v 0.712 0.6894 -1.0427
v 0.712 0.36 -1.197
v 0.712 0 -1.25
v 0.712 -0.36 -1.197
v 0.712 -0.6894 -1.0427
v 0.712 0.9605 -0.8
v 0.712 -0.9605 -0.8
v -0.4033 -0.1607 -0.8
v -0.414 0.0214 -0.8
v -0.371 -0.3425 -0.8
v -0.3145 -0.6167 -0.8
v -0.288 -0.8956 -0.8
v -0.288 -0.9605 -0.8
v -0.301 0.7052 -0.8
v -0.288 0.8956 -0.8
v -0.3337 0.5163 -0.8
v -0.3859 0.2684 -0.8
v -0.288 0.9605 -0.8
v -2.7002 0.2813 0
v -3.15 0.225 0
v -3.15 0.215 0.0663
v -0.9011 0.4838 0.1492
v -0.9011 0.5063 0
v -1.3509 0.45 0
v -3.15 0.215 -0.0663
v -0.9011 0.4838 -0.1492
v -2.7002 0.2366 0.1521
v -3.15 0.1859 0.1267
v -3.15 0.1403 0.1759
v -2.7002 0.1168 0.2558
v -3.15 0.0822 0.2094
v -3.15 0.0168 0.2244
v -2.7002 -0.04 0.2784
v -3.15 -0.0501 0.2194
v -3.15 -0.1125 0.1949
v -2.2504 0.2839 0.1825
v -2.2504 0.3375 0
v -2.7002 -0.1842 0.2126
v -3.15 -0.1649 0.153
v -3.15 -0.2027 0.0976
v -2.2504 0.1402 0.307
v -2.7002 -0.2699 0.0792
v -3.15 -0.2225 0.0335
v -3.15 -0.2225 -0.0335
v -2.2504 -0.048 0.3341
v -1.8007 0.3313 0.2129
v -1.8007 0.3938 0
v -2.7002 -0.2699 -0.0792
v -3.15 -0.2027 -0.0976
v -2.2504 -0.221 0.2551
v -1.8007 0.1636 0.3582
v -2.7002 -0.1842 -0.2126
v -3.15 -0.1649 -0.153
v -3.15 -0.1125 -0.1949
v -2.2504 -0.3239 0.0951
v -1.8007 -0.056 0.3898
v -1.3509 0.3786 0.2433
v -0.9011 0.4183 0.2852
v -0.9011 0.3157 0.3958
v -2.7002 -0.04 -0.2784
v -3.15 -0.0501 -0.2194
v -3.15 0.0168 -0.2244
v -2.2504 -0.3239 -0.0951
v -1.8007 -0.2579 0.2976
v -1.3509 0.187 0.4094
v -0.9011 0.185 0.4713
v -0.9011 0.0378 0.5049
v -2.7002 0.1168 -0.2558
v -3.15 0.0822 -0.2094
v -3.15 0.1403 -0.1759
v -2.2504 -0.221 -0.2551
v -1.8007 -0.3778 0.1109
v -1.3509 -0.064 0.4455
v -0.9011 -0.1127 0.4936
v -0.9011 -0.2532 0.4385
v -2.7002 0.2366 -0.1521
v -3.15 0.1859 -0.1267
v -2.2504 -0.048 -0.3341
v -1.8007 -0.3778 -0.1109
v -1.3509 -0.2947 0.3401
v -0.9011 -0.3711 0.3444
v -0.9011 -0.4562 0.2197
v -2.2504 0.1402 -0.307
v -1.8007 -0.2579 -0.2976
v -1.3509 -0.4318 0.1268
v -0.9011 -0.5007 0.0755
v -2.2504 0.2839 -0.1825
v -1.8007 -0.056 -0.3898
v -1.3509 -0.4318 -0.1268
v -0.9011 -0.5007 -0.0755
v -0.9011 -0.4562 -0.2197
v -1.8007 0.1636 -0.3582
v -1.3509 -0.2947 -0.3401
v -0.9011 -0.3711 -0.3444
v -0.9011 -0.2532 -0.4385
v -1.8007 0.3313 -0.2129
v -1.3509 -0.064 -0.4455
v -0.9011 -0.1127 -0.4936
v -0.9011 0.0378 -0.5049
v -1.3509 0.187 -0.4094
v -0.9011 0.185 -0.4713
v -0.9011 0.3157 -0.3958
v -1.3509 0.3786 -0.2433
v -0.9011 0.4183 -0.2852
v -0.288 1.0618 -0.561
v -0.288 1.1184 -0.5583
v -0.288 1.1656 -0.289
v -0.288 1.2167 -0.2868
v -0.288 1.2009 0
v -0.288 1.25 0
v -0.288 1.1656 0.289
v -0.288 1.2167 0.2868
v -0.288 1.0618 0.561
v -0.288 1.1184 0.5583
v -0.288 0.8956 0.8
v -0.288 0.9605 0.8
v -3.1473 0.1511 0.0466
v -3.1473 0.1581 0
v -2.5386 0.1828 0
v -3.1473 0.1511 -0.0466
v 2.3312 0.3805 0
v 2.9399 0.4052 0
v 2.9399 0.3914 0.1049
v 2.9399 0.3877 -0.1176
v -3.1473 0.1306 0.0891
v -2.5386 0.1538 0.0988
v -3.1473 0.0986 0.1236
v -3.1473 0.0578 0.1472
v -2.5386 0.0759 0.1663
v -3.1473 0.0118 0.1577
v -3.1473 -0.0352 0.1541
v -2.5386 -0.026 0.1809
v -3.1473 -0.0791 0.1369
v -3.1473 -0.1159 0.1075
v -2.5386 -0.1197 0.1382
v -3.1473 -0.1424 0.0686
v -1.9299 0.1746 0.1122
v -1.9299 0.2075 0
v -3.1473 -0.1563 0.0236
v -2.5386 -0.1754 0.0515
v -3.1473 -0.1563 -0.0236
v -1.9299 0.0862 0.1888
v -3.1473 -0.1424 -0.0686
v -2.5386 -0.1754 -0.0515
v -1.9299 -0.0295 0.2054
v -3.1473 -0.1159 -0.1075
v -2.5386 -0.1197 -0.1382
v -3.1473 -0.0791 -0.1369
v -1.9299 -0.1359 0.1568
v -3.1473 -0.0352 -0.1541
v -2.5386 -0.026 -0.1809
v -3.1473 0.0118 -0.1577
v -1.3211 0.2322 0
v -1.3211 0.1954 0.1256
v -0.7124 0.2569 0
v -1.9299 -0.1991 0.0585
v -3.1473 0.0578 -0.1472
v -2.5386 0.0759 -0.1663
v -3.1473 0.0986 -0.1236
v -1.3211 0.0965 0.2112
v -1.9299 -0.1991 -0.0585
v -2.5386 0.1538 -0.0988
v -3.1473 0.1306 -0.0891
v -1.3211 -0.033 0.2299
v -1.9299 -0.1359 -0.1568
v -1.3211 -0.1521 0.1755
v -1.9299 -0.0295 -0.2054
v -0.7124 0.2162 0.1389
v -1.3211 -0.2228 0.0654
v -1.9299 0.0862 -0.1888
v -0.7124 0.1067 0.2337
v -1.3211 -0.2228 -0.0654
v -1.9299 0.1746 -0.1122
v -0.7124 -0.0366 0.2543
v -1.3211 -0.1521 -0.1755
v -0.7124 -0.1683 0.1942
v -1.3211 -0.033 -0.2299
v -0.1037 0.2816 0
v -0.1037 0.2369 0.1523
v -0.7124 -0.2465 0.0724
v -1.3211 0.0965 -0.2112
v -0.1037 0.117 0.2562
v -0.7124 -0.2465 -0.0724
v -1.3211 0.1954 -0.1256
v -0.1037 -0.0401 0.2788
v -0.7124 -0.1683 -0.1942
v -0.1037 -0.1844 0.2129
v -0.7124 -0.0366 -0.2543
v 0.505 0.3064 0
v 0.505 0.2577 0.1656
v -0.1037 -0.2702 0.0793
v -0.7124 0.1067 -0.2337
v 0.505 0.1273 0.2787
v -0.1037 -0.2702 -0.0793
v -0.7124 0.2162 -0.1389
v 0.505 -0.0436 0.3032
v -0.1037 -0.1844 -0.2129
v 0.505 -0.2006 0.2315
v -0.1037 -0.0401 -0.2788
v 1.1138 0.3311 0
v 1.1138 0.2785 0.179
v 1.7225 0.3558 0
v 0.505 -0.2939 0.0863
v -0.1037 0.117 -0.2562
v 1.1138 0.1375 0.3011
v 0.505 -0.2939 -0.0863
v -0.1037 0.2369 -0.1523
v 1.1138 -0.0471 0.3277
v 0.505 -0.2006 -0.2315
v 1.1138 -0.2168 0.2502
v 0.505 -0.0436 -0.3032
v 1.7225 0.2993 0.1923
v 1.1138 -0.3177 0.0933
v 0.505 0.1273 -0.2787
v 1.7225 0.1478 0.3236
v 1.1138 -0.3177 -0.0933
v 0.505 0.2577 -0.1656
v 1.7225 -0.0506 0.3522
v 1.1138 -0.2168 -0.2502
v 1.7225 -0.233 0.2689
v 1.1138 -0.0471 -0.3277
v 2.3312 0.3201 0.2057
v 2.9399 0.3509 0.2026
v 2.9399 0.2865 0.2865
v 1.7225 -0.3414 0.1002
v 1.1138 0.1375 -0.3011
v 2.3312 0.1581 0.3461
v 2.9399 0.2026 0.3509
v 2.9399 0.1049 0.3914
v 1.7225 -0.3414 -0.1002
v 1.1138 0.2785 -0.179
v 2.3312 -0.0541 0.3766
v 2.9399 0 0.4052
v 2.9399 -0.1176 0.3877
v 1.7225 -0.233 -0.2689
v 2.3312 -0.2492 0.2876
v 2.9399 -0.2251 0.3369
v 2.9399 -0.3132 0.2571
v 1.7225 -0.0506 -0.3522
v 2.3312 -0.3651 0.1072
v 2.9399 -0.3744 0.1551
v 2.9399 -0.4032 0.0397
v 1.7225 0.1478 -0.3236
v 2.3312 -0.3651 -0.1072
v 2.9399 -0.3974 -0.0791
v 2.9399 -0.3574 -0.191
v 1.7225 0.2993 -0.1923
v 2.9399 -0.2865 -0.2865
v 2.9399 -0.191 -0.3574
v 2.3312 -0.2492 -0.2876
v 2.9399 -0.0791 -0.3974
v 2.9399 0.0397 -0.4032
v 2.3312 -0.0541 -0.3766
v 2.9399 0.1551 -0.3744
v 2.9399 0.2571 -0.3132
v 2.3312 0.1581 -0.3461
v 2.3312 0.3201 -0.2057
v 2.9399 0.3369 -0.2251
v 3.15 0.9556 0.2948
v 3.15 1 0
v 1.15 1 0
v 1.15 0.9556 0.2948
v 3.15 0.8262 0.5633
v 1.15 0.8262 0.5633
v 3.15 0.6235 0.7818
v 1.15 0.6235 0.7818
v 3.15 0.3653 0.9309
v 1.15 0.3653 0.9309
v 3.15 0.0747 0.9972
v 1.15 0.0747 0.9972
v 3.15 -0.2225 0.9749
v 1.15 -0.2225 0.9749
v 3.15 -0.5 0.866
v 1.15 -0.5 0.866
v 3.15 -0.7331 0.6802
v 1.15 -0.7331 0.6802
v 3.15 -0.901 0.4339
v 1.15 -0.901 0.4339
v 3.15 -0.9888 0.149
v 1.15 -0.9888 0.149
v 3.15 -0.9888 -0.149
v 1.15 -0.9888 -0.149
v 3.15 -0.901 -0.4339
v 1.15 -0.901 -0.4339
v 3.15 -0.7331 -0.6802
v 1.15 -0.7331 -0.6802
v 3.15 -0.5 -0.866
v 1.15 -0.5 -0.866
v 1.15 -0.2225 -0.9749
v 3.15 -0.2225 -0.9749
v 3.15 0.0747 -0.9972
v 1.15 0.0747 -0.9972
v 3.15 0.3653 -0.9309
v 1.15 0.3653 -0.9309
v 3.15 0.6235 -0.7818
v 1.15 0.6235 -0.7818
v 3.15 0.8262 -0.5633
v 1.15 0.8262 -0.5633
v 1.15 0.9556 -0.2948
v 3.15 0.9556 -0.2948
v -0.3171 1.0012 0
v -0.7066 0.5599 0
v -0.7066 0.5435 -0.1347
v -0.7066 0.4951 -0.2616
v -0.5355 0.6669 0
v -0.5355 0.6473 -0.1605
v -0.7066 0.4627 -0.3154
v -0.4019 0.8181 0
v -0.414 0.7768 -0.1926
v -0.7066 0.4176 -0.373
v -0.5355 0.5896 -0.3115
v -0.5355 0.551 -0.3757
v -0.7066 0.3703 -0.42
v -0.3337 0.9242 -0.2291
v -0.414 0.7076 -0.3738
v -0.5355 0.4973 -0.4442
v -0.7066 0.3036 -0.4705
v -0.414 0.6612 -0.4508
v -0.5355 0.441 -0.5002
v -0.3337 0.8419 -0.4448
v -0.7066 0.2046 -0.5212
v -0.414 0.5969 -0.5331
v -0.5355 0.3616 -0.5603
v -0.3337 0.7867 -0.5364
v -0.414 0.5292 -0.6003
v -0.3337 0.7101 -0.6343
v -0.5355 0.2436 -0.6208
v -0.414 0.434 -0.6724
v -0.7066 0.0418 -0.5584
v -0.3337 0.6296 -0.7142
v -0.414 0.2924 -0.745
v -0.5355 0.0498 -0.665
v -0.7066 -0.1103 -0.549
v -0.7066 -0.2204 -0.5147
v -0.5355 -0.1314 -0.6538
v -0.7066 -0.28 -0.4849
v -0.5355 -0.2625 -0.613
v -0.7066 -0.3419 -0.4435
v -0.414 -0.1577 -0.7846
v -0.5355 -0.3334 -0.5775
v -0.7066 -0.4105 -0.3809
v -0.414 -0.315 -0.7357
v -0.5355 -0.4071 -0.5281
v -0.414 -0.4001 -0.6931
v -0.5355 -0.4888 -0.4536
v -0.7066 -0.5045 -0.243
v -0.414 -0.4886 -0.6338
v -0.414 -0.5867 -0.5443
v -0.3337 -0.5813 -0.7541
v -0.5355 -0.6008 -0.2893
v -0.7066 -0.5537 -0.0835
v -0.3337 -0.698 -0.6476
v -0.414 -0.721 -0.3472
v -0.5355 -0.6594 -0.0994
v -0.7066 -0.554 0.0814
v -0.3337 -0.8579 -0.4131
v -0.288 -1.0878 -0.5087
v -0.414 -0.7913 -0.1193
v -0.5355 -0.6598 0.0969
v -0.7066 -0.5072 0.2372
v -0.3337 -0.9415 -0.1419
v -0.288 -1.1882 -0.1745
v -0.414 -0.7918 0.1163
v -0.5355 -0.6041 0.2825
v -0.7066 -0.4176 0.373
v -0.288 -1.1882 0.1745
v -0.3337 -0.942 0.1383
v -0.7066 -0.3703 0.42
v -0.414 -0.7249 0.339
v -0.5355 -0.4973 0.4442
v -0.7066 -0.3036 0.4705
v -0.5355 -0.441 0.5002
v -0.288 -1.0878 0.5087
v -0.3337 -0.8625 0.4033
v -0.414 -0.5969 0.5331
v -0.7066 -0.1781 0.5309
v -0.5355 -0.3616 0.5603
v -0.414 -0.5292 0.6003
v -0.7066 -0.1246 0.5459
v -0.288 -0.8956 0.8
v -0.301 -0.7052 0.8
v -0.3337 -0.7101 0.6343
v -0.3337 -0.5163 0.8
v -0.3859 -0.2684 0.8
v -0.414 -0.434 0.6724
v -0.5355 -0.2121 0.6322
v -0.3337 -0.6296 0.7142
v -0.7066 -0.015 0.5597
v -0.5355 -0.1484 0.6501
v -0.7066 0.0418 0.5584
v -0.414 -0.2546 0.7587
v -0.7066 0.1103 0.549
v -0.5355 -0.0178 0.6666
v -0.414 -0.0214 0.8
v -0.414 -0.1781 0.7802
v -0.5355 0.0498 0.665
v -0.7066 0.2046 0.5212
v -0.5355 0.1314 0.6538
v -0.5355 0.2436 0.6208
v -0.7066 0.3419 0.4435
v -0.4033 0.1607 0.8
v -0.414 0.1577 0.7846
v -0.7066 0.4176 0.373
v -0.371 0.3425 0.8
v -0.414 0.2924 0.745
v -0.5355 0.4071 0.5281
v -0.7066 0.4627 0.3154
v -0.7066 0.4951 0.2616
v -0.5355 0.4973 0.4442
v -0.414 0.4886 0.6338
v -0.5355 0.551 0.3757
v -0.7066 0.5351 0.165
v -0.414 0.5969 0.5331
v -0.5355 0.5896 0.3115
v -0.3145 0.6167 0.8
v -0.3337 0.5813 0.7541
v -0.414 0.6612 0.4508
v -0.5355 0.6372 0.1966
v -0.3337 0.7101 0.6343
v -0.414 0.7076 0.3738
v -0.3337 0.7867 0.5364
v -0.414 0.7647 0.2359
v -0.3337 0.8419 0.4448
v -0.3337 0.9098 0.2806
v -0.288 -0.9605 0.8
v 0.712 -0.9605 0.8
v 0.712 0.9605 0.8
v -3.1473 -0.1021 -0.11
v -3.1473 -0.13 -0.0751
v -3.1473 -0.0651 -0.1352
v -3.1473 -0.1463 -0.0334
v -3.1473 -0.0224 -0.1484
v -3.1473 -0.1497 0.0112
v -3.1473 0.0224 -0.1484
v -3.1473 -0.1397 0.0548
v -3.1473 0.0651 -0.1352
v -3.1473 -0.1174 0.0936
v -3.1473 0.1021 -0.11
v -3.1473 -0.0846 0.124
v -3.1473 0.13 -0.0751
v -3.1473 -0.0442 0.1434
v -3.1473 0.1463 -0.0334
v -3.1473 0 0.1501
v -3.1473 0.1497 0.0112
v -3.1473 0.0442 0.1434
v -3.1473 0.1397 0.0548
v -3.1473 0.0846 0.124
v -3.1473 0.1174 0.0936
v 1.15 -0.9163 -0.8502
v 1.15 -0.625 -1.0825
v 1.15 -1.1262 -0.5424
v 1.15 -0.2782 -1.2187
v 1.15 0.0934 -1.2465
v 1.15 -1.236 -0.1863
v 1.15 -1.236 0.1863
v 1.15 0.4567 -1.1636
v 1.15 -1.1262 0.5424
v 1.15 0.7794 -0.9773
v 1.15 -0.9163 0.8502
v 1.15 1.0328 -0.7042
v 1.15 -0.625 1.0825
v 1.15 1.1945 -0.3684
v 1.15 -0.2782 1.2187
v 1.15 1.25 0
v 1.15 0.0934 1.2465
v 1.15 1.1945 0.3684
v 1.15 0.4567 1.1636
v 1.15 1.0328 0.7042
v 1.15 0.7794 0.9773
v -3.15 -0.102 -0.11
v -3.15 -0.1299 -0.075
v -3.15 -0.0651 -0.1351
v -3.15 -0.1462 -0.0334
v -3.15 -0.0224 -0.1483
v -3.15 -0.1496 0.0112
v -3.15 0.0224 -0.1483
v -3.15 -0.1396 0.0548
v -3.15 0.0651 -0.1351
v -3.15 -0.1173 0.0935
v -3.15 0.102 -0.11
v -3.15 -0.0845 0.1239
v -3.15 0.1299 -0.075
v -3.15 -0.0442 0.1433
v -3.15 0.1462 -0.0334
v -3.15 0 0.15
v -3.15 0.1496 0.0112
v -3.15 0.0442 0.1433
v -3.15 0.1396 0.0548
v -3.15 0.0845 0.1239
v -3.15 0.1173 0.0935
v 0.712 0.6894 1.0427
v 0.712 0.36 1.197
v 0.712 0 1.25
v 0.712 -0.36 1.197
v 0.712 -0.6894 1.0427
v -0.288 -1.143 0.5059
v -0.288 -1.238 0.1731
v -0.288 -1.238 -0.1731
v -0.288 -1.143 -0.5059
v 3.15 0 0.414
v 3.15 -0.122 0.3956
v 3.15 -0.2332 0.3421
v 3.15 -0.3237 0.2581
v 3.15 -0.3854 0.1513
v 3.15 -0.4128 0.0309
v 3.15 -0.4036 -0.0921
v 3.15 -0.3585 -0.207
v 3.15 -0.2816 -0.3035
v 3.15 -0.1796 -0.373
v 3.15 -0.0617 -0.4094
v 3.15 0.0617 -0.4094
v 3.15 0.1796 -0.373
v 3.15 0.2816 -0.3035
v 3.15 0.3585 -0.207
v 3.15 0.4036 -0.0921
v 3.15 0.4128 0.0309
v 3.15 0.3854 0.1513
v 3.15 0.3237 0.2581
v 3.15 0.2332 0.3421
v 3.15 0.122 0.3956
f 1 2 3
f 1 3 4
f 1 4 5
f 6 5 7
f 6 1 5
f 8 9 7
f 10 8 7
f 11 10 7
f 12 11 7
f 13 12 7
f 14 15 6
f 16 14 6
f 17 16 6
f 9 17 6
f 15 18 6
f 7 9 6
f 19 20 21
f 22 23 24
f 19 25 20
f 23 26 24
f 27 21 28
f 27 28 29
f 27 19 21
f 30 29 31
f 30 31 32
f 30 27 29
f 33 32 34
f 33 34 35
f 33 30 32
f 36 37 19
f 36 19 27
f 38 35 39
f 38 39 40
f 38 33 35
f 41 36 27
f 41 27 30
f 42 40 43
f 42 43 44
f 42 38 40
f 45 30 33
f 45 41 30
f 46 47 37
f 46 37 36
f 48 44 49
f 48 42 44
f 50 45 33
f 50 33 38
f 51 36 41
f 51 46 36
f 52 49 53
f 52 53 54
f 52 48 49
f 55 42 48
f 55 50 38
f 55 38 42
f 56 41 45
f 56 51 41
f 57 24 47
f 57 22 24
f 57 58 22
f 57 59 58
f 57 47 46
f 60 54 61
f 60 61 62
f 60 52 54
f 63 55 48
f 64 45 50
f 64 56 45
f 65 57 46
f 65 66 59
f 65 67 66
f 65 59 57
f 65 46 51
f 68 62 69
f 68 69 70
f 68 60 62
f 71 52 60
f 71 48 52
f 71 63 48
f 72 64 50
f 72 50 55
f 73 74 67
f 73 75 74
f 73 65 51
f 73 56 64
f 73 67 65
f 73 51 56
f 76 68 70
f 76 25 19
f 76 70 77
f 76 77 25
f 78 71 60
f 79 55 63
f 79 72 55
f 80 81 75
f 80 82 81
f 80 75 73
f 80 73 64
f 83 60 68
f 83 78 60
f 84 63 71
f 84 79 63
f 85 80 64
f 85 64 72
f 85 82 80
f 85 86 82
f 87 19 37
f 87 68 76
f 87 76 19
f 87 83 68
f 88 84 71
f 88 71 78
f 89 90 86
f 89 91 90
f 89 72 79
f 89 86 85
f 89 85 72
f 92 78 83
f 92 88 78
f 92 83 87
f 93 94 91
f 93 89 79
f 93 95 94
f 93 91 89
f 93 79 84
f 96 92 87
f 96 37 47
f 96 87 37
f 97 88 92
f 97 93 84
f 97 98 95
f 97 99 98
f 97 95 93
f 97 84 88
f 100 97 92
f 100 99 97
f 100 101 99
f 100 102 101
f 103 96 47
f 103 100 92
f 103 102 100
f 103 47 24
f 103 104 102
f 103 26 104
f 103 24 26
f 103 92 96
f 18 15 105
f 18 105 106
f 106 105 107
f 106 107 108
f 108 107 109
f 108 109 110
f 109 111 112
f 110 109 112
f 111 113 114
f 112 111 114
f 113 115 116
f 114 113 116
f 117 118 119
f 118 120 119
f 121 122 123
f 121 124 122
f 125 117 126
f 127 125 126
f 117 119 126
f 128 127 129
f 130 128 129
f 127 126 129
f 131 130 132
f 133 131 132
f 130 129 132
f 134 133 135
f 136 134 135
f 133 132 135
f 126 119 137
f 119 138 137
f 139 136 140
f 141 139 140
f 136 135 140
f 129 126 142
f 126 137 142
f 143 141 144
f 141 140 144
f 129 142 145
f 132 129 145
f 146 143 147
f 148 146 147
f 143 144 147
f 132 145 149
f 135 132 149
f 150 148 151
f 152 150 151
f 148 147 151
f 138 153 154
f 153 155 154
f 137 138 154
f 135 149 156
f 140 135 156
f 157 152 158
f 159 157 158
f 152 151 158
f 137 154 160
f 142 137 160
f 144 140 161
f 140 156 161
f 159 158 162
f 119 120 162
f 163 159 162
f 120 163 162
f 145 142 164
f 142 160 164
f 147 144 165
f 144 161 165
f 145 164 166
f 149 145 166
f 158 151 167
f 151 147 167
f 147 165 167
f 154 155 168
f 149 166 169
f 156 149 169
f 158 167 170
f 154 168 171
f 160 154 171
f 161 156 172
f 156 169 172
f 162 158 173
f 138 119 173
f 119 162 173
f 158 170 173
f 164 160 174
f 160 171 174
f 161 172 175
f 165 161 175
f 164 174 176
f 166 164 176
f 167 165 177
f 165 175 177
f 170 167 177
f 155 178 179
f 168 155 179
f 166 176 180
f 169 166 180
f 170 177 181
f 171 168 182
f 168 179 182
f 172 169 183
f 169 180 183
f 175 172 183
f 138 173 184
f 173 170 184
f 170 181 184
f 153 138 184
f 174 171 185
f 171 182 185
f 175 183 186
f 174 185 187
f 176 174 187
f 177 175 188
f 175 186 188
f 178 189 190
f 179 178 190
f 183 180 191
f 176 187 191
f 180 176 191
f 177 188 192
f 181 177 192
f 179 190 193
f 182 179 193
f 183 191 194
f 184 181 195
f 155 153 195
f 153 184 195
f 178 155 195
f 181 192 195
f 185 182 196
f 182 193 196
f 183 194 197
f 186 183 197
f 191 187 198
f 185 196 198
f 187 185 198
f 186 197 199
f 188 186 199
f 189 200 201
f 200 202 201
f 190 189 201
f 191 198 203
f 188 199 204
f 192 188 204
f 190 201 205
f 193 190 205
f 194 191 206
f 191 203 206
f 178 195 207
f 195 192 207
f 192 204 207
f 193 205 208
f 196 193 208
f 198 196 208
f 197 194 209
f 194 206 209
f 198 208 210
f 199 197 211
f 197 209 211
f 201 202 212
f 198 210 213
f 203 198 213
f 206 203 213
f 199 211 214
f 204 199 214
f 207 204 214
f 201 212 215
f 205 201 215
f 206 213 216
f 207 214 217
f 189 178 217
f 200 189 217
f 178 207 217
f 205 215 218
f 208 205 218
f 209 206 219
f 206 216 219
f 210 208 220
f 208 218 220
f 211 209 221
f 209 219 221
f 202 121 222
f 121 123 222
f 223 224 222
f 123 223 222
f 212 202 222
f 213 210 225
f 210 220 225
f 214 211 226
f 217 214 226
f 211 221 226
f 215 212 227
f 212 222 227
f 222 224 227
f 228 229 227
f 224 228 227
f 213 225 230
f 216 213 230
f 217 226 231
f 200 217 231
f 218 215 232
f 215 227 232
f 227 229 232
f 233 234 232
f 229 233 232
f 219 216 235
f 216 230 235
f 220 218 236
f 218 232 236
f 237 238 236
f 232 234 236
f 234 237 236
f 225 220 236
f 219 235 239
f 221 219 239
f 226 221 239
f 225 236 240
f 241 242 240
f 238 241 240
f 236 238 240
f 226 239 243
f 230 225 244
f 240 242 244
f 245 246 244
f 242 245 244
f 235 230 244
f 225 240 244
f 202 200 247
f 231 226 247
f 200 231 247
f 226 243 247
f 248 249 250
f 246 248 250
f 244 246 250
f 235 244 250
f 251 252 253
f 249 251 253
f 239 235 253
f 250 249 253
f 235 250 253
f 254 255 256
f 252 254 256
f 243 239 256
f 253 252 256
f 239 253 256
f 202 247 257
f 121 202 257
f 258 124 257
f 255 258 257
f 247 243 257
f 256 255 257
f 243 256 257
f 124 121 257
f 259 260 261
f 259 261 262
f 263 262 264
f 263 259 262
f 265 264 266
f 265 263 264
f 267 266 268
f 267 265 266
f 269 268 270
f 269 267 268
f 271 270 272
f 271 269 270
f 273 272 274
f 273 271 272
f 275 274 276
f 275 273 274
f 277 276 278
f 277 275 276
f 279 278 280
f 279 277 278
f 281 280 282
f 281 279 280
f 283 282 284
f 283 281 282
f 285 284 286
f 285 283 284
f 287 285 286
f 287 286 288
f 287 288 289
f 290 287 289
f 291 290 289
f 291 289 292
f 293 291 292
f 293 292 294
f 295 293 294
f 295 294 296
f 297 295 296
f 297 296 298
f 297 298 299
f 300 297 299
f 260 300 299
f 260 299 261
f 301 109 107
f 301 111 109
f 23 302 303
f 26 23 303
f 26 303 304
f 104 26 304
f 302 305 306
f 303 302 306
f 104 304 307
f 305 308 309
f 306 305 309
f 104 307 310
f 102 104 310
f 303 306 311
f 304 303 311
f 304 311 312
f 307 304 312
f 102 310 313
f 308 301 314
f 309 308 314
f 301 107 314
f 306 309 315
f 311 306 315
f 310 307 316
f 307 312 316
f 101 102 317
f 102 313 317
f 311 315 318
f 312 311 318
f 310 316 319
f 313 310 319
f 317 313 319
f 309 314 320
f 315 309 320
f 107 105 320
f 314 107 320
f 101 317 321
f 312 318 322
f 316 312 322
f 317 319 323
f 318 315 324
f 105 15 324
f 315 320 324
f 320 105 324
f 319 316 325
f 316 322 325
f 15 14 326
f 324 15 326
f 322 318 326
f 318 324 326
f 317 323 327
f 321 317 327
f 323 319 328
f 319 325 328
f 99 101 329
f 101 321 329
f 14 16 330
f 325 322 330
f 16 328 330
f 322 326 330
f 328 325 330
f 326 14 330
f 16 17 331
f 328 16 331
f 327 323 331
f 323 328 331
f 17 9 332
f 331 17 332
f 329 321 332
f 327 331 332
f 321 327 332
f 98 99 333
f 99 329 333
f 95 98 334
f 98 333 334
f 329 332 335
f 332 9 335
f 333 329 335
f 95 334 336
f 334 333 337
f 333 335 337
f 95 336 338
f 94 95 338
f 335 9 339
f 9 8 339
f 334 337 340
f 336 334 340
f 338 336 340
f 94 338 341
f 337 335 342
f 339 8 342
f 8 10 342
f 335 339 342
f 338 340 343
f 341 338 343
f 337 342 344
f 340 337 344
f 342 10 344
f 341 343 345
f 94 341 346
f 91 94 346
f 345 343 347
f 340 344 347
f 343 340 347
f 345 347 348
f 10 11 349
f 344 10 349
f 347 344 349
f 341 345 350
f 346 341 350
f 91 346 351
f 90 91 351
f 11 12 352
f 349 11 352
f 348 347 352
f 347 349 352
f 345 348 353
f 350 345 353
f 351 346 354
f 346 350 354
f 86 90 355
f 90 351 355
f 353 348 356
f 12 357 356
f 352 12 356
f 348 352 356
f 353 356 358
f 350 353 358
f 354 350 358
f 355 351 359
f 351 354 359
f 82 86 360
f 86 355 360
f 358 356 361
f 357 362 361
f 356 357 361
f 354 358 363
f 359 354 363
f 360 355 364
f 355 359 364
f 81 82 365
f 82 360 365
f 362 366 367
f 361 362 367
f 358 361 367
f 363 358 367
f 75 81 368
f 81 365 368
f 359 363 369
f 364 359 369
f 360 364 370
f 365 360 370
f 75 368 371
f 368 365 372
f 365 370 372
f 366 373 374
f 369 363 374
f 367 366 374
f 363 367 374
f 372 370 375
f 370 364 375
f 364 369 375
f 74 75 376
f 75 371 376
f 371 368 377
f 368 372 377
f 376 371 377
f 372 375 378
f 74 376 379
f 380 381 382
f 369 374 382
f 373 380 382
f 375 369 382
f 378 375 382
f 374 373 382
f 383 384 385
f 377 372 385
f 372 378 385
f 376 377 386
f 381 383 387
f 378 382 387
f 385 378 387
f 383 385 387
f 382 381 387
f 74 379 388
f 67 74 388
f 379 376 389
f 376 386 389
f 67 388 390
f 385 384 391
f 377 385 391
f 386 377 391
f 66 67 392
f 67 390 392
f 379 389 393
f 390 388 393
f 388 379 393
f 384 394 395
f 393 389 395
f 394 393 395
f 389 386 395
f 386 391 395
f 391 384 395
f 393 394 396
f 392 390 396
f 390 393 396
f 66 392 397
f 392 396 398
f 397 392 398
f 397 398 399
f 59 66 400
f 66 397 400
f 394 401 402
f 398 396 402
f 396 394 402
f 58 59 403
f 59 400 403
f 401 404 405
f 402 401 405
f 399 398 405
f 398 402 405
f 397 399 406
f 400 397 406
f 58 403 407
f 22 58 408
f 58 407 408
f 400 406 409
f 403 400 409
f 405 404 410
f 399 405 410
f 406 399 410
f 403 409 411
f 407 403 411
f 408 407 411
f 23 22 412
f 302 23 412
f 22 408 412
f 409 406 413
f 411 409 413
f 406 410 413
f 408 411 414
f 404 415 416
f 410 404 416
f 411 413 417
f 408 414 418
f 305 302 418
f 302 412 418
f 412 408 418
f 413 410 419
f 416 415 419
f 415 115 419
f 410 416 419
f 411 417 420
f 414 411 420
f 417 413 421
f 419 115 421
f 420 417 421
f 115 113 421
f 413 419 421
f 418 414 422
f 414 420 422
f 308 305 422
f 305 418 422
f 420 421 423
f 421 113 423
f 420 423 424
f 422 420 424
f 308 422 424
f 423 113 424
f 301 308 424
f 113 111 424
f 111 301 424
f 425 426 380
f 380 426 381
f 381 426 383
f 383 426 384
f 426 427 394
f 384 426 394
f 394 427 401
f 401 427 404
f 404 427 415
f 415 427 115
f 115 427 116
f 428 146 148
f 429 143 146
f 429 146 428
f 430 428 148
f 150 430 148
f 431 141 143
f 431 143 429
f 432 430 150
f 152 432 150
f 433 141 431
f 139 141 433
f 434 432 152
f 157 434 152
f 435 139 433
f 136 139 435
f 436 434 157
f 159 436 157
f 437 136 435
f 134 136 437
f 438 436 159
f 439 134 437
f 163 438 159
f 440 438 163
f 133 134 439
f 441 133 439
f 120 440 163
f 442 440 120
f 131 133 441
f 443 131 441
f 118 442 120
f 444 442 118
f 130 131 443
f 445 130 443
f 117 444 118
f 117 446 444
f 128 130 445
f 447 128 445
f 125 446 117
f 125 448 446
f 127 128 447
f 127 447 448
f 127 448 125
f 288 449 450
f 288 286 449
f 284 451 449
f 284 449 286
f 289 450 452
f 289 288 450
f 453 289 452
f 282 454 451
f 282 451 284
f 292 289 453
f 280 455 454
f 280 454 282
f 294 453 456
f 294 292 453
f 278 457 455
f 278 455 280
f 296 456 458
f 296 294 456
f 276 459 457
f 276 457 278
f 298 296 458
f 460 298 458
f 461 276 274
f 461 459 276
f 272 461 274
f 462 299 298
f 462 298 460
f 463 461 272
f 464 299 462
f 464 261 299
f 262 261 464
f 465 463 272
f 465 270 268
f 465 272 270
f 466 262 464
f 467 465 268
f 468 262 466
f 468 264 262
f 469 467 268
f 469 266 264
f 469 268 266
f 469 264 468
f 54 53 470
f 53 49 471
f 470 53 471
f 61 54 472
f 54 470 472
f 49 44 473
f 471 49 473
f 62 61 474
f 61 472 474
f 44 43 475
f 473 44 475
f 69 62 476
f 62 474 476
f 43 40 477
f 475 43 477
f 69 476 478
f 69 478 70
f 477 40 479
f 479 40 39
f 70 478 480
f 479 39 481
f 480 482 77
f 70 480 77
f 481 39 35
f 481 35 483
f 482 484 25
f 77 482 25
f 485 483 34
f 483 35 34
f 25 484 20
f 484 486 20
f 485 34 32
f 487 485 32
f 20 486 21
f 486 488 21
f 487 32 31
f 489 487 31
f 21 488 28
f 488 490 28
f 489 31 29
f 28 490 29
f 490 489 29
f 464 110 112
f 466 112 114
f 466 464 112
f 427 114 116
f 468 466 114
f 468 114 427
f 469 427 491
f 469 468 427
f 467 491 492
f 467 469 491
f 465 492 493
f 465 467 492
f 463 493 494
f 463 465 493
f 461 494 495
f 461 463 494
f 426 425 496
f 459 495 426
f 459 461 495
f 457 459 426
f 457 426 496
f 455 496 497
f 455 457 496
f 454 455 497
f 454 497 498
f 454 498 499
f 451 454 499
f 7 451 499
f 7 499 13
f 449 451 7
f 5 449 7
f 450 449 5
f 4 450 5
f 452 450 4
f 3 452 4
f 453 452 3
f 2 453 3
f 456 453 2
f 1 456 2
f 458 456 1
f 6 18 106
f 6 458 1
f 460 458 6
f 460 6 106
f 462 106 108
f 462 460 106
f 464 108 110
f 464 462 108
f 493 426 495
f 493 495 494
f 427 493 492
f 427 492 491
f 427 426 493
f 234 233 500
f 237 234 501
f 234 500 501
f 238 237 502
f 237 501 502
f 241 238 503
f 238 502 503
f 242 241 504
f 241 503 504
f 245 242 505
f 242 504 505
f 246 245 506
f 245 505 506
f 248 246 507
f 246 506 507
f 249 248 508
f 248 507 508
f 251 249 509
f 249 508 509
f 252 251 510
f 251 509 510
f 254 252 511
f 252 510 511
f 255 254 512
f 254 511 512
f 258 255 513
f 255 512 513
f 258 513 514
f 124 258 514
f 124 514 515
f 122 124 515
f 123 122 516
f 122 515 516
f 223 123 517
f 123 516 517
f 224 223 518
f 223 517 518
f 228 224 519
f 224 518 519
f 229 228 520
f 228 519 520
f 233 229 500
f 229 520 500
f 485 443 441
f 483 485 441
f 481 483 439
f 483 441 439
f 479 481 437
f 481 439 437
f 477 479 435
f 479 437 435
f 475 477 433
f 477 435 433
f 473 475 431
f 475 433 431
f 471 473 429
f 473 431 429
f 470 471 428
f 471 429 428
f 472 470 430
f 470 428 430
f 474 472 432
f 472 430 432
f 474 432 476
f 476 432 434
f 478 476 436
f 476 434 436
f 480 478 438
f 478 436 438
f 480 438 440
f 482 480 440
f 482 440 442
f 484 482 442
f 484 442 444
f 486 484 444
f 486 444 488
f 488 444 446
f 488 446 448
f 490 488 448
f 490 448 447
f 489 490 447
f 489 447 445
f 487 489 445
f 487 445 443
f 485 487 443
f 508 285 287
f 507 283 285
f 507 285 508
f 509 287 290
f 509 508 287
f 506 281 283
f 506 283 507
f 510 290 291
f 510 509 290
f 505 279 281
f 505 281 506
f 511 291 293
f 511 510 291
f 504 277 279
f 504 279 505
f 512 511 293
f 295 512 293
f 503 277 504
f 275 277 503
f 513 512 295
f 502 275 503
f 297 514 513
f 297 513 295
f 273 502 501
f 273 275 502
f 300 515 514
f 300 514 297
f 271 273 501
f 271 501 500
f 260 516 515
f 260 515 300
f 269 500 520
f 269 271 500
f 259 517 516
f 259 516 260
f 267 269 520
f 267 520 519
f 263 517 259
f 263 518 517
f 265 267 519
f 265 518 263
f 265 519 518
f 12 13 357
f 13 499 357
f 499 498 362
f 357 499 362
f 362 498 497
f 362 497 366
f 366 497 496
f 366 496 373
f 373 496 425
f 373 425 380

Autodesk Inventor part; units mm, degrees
sketch "Skizze1" plane through (0, 0, 0) normal (0, 0, 1) x (1, 0, 0)
  line L0 (-4.5575, 0) -> (5.2951, 0) projected
  line L1 (0, -0.25) -> (0, 1.5) projected
  line L2 (-3.15, 0) -> (-3.15, 0.225)
  line L3 (-3.15, 0.225) -> (-0.288, 0.583)
  line L4 (-3.15, 0.225) -> (-0.2657, 0.225) construction
  line L5 (-0.288, 0.583) -> (-0.288, 1.25)
  line L6 (-0.288, 1.25) -> (1.15, 1.25)
  line L7 (1.15, 1.25) -> (1.15, 1)
  line L8 (1.15, 1) -> (3.15, 1)
  line L9 (3.15, 1) -> (3.15, 0)
  arc A0 (3.8876, 1) -> (3.801, 0.95) centre (3.8876, 0.9) ccw
  arc A1 (3.2366, 0.95) -> (3.15, 1) centre (3.15, 0.9) ccw
  arc A2 (3.4322, 0.6112) -> (3.6054, 0.6112) centre (3.5188, 0.6612) ccw
  line L10 (3.4322, 0.6112) -> (3.2366, 0.95)
  line L11 (3.6054, 0.6112) -> (3.801, 0.95)
  line L12 (3.8876, 1) -> (3.15, 1)
  point P0 (0, 0)
  point P1 (3.1775, 0.57)
  dimension "d0" = 7.13
  dimension "d1" = 2
  dimension "d2" = 2.862
  dimension "d3" = 6.3
  dimension "d4" = 2
  dimension "d5" = 2.5
  dimension "d6" = 0.45
  dimension "d27" = 0.2
  dimension "d28" = 0.2
  dimension "d29" = 0.2
  dimension "d30" = 60
revolve "Umdrehung1" add sketch "Skizze1" angle 360 about axis through (-10, 0, 0) along (1, 0, 0) contours L2 L3 L5 L6 L1 L0 | L1 L6 L7 L8 L9 L0
sketch "Skizze2" plane through (-0.288, 0, 0) normal (-1, 0, 0) x (0, 0, 1)
  circle A0 centre (0, 0) radius 0.583 projected
  circle A1 centre (0, 0) radius 1.25 projected
  circle A2 centre (0, 0) radius 1.25 projected
  line L0 (-0.8, -0.9605) -> (-0.8, 0.9605)
  line L1 (0, -1.75) -> (0, 1.75) projected
  line L2 (-1.75, 0) -> (1.75, 0) projected
  line L3 (0.8, -0.9605) -> (0.8, 0.9605)
  circle A3 centre (0, 0) radius 0.225 projected
  arc A4 (-0.8, 0.9605) -> (-0.8, -0.9605) centre (0, 0) ccw
  arc A5 (0.8, -0.9605) -> (0.8, 0.9605) centre (0, 0) ccw
  dimension "d10" = 1.6
extrude "Extrusion1" cut sketch "Skizze2" against normal blind 1 contours L3 A1 L2 | L2 A1 L3 | L2 A1 L0 | L0 A1 L2
fillet "Rundung1" radius 0.7 1 edges at (-0.288, -0.583, 0)
ref_plane "Arbeitsebene1" through (1.565, 0, 0) normal (1, 0, 0) x (0, 0, -1)
ref_plane "Arbeitsebene2" through (0, 0, 0) normal (0, 1, 0) x (-1, 0, 0)
sketch "Skizze4" plane through (0, 0, 0) normal (0, 1, 0) x (-1, 0, 0)
  line L0 (-3.15, 1) -> (-3.15, -1) projected
  line L1 (-3.15, 0.414) -> (3.15, 0.15)
  line L2 (3.15, 0.225) -> (3.15, -0.225) projected
  line L3 (4.41, 0) -> (-4.41, 0) projected
  line L4 (-3.15, 0.414) -> (-3.15, 0)
  line L5 (3.15, 0.15) -> (3.15, 0)
  point P0 (0, 0)
  dimension "d24" = 177.6
  dimension "d25" = 0.828
revolve "Umdrehung2" cut sketch "Skizze4" angle 360 about axis through (-10, 0, 0) along (1, 0, 0)
ref_plane "Arbeitsebene3" through (0, 0, 0) normal (0, 1, 0) x (-1, 0, 0)
ref_plane "Arbeitsebene4" through (1.15, 0, 0) normal (1, 0, 0) x (0, 1, 0)
sketch "Skizze7" plane through (1.15, 0, 0) normal (1, 0, 0) x (0, 1, 0)
  circle A0 centre (0, 0) radius 1
  circle A1 centre (0, 0) radius 0.3301
  dimension "d48" = 2
extrude "Extrusion5" add sketch "Skizze7" along normal blind 0.45
ref_plane "Arbeitsebene5" through (0, 0, 0) normal (0, 0, 1) x (1, 0, 0)
sketch "Skizze8" plane through (0, 0, 0) normal (0, 0, 1) x (1, 0, 0)
  line L0 (-3.892, 0) -> (3.9838, 0)
  line L1 (-3.1473, 0.1581) -> (3.1494, 0.4137)
  line L2 (-3.1473, 0.1581) -> (-3.1473, 0)
  line L3 (3.1494, 0.4137) -> (3.1494, 0)
  line L4 (-3.1473, 0) -> (3.1494, 0)
  point P0 (0, 0)
  dimension "d56" = 0.3163
  dimension "d57" = 0.8275
revolve "Umdrehung3" cut sketch "Skizze8" angle 360 about axis through (-3.892, 0, 0) along (1, 0, 0)
thread "Gewinde2" size "M2x0.4" class "6g" standard "ISO Metric profile" length 10
properties part number "YTP-AP-E03-R1.0" material "Stahl"
